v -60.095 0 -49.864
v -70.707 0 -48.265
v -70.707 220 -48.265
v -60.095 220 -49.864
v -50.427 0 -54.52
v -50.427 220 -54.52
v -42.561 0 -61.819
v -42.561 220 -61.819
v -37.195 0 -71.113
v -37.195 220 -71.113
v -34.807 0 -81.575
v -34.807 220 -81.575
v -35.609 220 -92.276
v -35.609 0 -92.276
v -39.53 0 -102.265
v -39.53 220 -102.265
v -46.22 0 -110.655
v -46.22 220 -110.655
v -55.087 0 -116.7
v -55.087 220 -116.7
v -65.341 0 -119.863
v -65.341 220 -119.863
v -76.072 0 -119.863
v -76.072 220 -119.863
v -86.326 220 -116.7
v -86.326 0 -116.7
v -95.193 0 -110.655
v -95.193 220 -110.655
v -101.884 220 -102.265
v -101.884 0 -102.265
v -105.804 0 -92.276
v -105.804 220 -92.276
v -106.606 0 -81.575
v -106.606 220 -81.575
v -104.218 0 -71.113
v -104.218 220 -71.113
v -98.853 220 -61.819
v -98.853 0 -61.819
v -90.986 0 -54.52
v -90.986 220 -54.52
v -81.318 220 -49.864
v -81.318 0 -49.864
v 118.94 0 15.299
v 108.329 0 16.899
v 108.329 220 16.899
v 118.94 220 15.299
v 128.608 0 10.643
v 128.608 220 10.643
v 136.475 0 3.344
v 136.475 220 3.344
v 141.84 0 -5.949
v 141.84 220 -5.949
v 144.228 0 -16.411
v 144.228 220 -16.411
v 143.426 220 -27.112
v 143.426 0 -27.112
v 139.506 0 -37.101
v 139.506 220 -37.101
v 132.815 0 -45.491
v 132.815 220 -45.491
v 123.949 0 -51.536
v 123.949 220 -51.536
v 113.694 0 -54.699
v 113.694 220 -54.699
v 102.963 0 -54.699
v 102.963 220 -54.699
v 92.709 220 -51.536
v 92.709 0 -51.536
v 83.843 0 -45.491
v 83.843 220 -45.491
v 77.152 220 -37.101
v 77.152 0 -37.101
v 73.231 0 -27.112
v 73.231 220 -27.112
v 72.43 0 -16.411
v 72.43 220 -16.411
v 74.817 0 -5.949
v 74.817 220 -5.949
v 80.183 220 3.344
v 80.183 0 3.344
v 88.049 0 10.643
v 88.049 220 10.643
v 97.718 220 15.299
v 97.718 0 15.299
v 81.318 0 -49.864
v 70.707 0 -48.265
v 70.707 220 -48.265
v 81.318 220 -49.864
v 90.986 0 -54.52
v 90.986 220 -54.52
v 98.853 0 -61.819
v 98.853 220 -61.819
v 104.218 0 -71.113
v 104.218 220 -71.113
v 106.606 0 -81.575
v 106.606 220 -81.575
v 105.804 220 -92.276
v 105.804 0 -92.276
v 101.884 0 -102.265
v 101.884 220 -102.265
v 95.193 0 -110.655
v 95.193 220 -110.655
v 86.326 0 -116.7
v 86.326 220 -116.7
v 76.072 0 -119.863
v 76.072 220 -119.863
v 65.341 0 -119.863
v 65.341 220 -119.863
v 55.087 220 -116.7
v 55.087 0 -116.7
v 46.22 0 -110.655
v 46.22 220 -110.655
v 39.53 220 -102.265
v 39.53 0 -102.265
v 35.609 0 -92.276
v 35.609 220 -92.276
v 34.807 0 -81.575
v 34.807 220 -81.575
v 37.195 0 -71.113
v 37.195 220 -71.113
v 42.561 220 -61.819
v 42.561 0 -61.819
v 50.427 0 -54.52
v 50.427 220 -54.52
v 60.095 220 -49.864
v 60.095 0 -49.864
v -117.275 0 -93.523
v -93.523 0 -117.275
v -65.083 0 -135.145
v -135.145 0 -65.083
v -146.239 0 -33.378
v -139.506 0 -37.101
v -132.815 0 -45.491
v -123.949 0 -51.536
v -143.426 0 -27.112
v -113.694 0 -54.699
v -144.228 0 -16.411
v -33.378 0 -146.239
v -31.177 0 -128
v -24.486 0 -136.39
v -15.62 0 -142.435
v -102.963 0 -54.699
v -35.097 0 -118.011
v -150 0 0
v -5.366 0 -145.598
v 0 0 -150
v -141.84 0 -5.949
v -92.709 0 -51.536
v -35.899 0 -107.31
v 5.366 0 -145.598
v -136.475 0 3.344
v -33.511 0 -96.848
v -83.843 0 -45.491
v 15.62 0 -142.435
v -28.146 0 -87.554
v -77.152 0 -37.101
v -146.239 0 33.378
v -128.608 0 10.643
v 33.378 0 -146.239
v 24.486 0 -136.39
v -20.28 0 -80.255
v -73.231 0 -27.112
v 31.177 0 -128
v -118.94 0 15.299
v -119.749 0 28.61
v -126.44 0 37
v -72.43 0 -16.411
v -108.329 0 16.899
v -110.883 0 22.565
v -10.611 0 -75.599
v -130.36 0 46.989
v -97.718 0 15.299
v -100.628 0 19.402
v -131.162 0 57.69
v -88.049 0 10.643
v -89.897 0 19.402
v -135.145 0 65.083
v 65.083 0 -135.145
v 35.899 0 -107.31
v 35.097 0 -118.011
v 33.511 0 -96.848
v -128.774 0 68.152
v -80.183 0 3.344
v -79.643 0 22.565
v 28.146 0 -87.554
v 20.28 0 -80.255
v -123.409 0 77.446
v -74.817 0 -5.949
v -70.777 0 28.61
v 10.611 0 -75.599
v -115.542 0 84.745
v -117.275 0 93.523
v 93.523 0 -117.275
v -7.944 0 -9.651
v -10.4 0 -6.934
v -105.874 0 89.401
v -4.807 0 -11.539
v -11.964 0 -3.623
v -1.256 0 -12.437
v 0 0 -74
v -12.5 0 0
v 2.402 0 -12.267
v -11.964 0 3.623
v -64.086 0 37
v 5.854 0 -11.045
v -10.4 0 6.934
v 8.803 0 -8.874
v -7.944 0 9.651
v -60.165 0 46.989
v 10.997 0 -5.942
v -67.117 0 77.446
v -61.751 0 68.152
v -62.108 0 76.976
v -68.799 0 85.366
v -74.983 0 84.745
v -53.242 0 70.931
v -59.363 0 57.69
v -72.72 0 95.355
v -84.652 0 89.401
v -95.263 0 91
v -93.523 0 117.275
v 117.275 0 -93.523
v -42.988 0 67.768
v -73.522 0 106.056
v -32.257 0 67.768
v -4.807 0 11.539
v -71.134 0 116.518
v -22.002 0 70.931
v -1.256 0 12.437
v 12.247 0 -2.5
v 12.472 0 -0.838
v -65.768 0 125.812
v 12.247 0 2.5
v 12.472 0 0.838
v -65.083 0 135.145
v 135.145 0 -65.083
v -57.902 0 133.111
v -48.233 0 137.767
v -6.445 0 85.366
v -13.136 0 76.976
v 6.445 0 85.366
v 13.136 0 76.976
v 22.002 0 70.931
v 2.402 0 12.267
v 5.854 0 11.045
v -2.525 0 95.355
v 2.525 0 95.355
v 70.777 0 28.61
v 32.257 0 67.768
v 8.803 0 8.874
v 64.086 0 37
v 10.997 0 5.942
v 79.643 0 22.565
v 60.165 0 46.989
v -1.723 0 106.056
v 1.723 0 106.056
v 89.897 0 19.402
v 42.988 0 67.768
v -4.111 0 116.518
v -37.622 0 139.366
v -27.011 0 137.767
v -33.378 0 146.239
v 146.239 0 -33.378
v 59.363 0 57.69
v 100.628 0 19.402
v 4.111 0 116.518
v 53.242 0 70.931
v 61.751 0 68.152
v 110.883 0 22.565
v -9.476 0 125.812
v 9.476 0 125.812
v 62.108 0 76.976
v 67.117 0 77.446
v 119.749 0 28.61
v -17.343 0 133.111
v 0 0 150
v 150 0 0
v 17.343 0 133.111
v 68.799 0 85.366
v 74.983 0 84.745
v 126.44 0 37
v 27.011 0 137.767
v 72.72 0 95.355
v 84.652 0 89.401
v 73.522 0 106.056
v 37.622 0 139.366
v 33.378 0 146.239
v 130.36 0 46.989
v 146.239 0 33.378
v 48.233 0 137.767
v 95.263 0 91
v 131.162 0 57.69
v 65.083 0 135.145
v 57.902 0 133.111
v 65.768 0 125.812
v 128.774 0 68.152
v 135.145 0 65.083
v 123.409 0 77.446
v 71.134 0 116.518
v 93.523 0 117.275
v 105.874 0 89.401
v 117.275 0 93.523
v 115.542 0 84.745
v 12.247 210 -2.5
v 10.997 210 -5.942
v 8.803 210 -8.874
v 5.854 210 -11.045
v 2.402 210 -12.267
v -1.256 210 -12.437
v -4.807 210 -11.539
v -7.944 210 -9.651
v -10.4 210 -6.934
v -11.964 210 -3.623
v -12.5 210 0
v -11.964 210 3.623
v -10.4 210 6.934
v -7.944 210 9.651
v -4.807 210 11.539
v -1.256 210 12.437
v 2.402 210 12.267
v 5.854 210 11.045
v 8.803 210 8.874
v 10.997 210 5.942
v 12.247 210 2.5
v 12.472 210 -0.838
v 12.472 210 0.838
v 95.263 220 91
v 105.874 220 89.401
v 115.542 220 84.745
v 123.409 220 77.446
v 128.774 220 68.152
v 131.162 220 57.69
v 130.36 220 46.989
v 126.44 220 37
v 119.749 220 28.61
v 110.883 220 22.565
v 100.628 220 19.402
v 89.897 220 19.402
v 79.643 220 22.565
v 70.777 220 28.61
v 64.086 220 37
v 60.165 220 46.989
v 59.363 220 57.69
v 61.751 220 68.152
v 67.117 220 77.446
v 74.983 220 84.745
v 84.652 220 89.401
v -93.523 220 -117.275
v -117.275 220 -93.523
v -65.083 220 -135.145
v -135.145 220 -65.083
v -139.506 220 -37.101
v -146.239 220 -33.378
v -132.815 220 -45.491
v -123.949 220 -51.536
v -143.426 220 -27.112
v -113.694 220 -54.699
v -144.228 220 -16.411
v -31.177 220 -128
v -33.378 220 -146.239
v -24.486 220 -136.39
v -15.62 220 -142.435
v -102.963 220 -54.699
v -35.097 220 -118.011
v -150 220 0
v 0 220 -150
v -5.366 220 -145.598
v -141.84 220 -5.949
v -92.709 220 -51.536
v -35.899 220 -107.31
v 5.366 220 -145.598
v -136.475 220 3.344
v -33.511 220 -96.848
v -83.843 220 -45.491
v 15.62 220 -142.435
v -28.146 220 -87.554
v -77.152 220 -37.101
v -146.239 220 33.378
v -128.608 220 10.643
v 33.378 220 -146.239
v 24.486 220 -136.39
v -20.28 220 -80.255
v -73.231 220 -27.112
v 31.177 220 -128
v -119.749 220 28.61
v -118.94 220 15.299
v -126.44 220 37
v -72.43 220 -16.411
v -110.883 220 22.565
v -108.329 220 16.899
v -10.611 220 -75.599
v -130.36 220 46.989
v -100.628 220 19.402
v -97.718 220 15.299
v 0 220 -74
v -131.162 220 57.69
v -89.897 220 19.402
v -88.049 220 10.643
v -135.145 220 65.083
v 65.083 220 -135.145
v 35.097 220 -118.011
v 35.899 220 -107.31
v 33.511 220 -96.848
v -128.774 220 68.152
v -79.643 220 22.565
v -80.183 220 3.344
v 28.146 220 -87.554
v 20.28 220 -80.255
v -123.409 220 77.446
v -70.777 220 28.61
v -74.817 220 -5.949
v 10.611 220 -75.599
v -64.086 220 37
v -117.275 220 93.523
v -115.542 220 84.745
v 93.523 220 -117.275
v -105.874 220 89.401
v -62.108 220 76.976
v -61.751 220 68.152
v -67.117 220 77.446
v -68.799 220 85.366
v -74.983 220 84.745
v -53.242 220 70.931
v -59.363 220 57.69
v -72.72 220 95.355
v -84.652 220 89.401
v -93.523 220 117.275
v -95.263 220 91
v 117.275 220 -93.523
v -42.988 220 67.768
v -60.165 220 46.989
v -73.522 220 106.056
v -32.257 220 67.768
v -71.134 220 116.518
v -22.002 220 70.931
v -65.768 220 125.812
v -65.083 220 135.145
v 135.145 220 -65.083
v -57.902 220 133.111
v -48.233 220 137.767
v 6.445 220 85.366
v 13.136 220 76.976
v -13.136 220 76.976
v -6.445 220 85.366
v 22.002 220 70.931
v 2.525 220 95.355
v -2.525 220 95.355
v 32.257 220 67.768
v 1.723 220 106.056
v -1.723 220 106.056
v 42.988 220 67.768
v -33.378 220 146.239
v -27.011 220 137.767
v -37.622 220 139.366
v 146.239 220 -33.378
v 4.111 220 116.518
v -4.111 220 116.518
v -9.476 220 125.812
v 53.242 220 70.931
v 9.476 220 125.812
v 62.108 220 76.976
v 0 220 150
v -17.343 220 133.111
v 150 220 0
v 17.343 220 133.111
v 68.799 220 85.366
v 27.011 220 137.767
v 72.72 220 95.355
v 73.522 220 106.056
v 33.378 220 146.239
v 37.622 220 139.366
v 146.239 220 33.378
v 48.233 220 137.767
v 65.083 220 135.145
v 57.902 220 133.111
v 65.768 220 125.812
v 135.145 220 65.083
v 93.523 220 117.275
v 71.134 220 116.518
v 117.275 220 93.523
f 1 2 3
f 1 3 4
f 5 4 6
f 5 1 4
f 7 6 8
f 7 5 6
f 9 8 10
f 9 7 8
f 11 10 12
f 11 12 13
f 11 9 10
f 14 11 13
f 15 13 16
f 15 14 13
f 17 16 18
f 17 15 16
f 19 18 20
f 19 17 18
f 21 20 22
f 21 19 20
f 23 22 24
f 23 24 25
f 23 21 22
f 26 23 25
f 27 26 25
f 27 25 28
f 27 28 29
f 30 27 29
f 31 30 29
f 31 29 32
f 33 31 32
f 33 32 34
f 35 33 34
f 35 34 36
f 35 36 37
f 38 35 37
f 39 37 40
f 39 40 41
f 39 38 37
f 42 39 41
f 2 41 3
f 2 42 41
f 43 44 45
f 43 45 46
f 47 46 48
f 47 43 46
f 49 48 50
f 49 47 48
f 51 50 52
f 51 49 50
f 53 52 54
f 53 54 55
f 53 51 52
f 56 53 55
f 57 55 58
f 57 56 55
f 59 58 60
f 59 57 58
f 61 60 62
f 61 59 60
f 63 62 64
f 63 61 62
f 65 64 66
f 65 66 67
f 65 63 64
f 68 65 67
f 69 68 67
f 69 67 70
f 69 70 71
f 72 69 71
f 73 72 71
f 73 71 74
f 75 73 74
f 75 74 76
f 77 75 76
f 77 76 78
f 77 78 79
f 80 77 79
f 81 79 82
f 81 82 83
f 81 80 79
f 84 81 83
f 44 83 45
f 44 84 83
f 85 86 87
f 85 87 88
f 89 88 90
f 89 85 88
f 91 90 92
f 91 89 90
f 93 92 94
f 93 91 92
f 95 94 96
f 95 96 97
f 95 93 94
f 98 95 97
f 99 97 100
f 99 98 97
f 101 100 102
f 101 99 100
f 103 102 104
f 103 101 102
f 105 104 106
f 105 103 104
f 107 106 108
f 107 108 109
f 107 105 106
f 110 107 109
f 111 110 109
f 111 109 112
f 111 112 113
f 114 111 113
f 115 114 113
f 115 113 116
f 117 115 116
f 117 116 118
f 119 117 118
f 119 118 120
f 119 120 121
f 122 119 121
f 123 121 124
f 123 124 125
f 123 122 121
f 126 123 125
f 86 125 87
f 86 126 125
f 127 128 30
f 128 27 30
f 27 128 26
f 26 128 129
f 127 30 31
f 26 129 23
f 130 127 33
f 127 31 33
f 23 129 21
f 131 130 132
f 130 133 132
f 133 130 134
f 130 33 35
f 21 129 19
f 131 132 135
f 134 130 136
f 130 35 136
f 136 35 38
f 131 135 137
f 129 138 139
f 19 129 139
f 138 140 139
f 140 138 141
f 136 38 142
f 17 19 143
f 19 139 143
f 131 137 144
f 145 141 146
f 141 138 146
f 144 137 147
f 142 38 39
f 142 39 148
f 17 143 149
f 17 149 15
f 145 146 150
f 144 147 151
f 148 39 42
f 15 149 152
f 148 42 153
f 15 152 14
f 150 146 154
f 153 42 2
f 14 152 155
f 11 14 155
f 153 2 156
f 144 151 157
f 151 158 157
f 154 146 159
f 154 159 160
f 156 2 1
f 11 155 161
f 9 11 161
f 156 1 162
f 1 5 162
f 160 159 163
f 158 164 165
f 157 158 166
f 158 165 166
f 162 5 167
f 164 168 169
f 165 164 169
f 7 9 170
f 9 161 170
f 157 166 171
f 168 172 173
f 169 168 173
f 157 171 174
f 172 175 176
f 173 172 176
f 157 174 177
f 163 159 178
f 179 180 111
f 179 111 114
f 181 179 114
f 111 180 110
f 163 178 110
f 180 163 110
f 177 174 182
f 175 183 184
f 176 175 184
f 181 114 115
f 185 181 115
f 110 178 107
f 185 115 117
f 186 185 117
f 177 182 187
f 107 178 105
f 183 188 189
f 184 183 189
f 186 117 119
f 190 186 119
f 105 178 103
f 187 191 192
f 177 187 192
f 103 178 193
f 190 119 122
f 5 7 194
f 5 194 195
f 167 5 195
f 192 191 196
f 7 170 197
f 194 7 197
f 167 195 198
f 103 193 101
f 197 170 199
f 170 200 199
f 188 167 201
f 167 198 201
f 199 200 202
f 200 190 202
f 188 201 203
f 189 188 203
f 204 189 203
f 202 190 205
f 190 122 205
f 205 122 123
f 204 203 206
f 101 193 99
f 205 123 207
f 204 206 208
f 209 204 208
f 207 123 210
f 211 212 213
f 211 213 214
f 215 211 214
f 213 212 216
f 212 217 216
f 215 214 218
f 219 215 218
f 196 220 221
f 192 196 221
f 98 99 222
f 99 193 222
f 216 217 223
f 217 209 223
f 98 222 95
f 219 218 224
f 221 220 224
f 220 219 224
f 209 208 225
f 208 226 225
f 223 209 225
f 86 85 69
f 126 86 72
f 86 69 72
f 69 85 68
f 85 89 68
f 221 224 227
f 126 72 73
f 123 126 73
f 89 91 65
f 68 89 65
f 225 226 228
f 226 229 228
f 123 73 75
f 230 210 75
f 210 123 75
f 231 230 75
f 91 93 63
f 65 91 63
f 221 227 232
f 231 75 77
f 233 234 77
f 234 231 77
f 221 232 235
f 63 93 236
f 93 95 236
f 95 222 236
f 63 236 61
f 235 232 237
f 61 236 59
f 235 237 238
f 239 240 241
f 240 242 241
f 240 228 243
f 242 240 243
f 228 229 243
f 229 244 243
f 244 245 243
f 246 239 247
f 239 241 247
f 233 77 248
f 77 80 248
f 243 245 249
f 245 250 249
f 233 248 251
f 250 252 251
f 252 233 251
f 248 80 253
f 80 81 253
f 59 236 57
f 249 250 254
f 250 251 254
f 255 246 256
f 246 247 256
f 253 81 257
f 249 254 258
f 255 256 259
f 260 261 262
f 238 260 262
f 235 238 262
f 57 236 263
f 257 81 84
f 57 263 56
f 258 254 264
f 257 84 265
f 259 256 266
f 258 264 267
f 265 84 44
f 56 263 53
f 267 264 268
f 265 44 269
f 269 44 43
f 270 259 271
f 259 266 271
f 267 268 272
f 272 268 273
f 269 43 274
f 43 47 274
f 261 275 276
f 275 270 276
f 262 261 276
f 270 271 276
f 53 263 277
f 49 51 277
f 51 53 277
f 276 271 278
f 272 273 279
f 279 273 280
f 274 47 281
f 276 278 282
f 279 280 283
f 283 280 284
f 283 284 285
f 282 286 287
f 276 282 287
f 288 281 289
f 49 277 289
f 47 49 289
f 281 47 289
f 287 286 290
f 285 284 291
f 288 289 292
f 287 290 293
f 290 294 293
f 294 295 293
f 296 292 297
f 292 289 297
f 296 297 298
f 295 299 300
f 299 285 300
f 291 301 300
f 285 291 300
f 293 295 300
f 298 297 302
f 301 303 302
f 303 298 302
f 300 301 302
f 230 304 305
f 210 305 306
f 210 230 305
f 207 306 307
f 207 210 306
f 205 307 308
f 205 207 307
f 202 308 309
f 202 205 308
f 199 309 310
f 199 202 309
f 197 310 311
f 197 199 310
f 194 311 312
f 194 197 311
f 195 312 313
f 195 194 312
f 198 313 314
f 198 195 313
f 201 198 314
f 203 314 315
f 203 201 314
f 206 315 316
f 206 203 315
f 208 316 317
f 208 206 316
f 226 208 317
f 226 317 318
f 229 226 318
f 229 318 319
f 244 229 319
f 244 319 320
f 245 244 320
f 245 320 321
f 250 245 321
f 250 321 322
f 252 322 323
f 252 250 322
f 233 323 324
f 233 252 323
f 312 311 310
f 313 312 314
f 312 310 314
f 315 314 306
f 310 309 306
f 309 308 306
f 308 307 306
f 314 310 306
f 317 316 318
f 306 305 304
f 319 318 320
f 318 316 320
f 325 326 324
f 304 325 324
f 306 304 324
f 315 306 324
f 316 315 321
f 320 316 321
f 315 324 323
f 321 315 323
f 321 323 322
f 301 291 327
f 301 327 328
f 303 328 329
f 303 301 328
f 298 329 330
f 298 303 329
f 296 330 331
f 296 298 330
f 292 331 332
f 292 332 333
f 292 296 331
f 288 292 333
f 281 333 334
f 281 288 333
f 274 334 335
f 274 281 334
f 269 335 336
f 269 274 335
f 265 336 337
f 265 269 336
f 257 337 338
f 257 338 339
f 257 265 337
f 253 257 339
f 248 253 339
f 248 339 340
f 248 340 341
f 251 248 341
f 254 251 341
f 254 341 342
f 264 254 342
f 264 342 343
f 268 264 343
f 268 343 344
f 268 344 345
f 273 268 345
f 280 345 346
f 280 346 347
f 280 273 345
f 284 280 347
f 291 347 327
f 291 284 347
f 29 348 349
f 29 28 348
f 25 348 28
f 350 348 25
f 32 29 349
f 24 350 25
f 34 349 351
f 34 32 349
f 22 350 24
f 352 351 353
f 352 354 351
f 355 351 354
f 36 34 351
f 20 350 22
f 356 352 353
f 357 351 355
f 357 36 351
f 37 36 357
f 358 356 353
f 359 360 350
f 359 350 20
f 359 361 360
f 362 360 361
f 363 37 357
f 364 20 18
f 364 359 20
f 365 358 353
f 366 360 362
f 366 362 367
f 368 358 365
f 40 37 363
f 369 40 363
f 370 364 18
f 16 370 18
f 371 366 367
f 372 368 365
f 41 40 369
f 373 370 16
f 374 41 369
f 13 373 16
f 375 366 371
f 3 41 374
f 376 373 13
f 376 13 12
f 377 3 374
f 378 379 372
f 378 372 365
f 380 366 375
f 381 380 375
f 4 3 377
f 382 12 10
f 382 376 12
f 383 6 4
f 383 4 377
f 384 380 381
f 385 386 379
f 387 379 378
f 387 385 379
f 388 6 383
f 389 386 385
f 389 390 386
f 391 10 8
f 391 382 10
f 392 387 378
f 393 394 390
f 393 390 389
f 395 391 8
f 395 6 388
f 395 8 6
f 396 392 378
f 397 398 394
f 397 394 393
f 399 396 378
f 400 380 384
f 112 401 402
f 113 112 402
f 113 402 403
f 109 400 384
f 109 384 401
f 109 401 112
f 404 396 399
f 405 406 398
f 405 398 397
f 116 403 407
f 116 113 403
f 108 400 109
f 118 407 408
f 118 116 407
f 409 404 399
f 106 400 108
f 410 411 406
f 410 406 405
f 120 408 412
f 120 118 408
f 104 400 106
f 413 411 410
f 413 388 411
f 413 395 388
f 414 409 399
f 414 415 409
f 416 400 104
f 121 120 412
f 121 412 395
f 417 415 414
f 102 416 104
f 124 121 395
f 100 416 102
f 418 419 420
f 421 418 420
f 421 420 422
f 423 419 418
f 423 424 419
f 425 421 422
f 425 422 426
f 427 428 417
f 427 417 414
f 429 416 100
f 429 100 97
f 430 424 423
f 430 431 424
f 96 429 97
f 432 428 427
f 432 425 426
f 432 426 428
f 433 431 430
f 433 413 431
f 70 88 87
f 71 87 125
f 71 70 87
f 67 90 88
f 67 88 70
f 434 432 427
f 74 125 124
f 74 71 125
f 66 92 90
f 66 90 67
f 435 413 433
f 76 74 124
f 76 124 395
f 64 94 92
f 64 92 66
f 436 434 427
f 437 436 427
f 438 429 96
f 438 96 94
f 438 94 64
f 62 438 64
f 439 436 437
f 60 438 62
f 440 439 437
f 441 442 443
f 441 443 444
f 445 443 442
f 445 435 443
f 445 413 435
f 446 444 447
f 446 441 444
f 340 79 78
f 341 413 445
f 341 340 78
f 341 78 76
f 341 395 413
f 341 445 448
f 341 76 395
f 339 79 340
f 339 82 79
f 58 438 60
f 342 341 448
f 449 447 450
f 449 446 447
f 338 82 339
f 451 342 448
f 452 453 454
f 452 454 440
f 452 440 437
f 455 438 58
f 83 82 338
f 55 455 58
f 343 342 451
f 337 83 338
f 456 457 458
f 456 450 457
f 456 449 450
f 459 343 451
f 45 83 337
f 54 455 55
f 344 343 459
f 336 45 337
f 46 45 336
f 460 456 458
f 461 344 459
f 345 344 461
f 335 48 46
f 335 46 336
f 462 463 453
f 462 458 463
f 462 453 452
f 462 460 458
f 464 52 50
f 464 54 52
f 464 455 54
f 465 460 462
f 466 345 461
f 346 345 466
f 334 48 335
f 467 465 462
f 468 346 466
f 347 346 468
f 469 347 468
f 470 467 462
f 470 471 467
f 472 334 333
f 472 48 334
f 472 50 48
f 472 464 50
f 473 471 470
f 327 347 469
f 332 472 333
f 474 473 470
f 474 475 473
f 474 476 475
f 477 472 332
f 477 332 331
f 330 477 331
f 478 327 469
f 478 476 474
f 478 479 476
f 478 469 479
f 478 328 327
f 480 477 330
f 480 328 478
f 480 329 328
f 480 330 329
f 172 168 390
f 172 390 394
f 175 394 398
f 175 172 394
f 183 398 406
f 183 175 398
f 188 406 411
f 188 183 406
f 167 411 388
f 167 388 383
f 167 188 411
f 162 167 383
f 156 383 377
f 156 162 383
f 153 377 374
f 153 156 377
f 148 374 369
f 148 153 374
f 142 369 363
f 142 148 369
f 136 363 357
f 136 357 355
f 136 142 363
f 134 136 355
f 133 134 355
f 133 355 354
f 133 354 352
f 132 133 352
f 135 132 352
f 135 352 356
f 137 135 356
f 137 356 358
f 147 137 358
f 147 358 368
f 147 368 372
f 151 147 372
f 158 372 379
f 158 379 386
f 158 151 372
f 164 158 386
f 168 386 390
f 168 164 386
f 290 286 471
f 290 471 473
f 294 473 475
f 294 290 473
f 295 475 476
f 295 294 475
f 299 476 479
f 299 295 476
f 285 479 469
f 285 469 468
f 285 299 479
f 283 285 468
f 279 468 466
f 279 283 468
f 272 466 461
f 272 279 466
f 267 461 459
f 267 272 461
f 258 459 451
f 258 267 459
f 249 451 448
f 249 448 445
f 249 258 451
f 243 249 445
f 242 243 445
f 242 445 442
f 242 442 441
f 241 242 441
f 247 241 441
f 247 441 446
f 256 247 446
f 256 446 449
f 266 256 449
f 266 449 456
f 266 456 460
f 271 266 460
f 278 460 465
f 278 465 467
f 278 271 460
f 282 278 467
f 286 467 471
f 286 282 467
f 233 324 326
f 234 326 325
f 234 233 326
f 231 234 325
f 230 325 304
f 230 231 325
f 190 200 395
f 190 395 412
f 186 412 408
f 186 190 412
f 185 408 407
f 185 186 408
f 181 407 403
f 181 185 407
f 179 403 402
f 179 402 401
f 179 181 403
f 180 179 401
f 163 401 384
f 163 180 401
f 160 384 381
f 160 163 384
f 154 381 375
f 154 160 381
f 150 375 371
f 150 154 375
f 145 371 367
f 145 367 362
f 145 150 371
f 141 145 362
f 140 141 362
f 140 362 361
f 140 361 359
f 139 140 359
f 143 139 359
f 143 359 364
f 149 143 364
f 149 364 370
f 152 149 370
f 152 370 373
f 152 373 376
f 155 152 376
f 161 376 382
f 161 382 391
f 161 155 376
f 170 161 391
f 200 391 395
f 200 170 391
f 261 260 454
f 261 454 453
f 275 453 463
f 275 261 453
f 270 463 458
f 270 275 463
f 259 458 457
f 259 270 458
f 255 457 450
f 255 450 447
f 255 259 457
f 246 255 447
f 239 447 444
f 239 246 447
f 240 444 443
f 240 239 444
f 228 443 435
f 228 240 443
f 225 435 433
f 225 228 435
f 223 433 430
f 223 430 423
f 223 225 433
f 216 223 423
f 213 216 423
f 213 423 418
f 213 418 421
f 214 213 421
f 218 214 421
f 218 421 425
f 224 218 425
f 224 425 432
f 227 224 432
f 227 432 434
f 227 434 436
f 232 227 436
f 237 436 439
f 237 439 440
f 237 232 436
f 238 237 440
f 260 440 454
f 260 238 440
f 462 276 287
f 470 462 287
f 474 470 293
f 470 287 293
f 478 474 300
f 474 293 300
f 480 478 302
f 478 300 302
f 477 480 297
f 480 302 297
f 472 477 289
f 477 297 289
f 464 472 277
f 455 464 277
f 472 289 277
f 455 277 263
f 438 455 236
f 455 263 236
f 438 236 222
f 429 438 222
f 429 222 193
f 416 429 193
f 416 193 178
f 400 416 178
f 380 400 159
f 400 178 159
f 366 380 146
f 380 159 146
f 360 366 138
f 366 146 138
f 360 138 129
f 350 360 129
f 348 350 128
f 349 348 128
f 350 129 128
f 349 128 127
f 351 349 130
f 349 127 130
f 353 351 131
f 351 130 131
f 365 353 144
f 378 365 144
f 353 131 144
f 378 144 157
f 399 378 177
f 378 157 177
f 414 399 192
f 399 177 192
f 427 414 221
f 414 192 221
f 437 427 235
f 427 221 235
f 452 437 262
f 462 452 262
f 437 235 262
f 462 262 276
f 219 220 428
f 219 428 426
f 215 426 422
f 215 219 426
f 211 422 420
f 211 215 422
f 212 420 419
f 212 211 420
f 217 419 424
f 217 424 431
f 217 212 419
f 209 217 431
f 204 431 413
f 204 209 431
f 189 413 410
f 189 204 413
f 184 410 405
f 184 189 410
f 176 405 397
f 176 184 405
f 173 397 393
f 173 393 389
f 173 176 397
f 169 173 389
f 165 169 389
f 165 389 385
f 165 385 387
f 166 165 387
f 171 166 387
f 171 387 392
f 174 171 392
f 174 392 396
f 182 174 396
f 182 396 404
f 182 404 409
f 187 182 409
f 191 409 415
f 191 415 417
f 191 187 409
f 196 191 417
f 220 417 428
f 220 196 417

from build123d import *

# Parameters (mm, degrees)
SKETCH_1_R      = 150
SKETCH_1_R_2    = 36
EXTRUDE_1_DEPTH = 220
EXTRUDE_START   = -10
SKETCH_2_R      = 12.5
EXTRUDE_2_DEPTH = 10


with BuildPart() as part:
    # 草圖1 → 填料-伸長1 (new body)
    with BuildSketch(Plane(origin=(0, 0, 0), x_dir=(1, 0, 0), z_dir=(0, 1, 0))):
        with Locations(Location((0, 0, 0), (0, 0, 270))):
            Circle(SKETCH_1_R)
        with Locations(Location((0, 110, 0), (0, 0, 270))):
            Circle(SKETCH_1_R_2, mode=Mode.SUBTRACT)
        with Locations(Location((70.706637066, 84.264888743, 0), (0, 0, 270))):
            Circle(SKETCH_1_R_2, mode=Mode.SUBTRACT)
        with Locations(Location((108.328852831, 19.101299543, 0), (0, 0, 270))):
            Circle(SKETCH_1_R_2, mode=Mode.SUBTRACT)
        with Locations(Location((95.262794416, -55, 0), (0, 0, 270))):
            Circle(SKETCH_1_R_2, mode=Mode.SUBTRACT)
        with Locations(Location((37.622215766, -103.366188286, 0), (0, 0, 270))):
            Circle(SKETCH_1_R_2, mode=Mode.SUBTRACT)
        with Locations(Location((-37.622215766, -103.366188286, 0), (0, 0, 270))):
            Circle(SKETCH_1_R_2, mode=Mode.SUBTRACT)
        with Locations(Location((-95.262794416, -55, 0), (0, 0, 270))):
            Circle(SKETCH_1_R_2, mode=Mode.SUBTRACT)
        with Locations(Location((-108.328852831, 19.101299543, 0), (0, 0, 270))):
            Circle(SKETCH_1_R_2, mode=Mode.SUBTRACT)
        with Locations(Location((-70.706637066, 84.264888743, 0), (0, 0, 270))):
            Circle(SKETCH_1_R_2, mode=Mode.SUBTRACT)
        with BuildLine():
            ThreePointArc((12.247448714, 2.5), (-12.5, 0), (12.247448714, -2.5))
            ThreePointArc((12.247448714, -2.5), (12.5, 0), (12.247448714, 2.5))
        make_face(mode=Mode.SUBTRACT)
    extrude(amount=EXTRUDE_1_DEPTH)

    # 草圖2 → 填料-伸長2 (add)
    with BuildSketch(Plane(origin=(0, 220, 0), x_dir=(1, 0, 0), z_dir=(0, 1, 0)).offset(EXTRUDE_START)):
        with Locations(Location((0, 0, 0), (0, 0, 270))):
            Circle(SKETCH_2_R)
    extrude(amount=EXTRUDE_2_DEPTH)


solid = part.part
